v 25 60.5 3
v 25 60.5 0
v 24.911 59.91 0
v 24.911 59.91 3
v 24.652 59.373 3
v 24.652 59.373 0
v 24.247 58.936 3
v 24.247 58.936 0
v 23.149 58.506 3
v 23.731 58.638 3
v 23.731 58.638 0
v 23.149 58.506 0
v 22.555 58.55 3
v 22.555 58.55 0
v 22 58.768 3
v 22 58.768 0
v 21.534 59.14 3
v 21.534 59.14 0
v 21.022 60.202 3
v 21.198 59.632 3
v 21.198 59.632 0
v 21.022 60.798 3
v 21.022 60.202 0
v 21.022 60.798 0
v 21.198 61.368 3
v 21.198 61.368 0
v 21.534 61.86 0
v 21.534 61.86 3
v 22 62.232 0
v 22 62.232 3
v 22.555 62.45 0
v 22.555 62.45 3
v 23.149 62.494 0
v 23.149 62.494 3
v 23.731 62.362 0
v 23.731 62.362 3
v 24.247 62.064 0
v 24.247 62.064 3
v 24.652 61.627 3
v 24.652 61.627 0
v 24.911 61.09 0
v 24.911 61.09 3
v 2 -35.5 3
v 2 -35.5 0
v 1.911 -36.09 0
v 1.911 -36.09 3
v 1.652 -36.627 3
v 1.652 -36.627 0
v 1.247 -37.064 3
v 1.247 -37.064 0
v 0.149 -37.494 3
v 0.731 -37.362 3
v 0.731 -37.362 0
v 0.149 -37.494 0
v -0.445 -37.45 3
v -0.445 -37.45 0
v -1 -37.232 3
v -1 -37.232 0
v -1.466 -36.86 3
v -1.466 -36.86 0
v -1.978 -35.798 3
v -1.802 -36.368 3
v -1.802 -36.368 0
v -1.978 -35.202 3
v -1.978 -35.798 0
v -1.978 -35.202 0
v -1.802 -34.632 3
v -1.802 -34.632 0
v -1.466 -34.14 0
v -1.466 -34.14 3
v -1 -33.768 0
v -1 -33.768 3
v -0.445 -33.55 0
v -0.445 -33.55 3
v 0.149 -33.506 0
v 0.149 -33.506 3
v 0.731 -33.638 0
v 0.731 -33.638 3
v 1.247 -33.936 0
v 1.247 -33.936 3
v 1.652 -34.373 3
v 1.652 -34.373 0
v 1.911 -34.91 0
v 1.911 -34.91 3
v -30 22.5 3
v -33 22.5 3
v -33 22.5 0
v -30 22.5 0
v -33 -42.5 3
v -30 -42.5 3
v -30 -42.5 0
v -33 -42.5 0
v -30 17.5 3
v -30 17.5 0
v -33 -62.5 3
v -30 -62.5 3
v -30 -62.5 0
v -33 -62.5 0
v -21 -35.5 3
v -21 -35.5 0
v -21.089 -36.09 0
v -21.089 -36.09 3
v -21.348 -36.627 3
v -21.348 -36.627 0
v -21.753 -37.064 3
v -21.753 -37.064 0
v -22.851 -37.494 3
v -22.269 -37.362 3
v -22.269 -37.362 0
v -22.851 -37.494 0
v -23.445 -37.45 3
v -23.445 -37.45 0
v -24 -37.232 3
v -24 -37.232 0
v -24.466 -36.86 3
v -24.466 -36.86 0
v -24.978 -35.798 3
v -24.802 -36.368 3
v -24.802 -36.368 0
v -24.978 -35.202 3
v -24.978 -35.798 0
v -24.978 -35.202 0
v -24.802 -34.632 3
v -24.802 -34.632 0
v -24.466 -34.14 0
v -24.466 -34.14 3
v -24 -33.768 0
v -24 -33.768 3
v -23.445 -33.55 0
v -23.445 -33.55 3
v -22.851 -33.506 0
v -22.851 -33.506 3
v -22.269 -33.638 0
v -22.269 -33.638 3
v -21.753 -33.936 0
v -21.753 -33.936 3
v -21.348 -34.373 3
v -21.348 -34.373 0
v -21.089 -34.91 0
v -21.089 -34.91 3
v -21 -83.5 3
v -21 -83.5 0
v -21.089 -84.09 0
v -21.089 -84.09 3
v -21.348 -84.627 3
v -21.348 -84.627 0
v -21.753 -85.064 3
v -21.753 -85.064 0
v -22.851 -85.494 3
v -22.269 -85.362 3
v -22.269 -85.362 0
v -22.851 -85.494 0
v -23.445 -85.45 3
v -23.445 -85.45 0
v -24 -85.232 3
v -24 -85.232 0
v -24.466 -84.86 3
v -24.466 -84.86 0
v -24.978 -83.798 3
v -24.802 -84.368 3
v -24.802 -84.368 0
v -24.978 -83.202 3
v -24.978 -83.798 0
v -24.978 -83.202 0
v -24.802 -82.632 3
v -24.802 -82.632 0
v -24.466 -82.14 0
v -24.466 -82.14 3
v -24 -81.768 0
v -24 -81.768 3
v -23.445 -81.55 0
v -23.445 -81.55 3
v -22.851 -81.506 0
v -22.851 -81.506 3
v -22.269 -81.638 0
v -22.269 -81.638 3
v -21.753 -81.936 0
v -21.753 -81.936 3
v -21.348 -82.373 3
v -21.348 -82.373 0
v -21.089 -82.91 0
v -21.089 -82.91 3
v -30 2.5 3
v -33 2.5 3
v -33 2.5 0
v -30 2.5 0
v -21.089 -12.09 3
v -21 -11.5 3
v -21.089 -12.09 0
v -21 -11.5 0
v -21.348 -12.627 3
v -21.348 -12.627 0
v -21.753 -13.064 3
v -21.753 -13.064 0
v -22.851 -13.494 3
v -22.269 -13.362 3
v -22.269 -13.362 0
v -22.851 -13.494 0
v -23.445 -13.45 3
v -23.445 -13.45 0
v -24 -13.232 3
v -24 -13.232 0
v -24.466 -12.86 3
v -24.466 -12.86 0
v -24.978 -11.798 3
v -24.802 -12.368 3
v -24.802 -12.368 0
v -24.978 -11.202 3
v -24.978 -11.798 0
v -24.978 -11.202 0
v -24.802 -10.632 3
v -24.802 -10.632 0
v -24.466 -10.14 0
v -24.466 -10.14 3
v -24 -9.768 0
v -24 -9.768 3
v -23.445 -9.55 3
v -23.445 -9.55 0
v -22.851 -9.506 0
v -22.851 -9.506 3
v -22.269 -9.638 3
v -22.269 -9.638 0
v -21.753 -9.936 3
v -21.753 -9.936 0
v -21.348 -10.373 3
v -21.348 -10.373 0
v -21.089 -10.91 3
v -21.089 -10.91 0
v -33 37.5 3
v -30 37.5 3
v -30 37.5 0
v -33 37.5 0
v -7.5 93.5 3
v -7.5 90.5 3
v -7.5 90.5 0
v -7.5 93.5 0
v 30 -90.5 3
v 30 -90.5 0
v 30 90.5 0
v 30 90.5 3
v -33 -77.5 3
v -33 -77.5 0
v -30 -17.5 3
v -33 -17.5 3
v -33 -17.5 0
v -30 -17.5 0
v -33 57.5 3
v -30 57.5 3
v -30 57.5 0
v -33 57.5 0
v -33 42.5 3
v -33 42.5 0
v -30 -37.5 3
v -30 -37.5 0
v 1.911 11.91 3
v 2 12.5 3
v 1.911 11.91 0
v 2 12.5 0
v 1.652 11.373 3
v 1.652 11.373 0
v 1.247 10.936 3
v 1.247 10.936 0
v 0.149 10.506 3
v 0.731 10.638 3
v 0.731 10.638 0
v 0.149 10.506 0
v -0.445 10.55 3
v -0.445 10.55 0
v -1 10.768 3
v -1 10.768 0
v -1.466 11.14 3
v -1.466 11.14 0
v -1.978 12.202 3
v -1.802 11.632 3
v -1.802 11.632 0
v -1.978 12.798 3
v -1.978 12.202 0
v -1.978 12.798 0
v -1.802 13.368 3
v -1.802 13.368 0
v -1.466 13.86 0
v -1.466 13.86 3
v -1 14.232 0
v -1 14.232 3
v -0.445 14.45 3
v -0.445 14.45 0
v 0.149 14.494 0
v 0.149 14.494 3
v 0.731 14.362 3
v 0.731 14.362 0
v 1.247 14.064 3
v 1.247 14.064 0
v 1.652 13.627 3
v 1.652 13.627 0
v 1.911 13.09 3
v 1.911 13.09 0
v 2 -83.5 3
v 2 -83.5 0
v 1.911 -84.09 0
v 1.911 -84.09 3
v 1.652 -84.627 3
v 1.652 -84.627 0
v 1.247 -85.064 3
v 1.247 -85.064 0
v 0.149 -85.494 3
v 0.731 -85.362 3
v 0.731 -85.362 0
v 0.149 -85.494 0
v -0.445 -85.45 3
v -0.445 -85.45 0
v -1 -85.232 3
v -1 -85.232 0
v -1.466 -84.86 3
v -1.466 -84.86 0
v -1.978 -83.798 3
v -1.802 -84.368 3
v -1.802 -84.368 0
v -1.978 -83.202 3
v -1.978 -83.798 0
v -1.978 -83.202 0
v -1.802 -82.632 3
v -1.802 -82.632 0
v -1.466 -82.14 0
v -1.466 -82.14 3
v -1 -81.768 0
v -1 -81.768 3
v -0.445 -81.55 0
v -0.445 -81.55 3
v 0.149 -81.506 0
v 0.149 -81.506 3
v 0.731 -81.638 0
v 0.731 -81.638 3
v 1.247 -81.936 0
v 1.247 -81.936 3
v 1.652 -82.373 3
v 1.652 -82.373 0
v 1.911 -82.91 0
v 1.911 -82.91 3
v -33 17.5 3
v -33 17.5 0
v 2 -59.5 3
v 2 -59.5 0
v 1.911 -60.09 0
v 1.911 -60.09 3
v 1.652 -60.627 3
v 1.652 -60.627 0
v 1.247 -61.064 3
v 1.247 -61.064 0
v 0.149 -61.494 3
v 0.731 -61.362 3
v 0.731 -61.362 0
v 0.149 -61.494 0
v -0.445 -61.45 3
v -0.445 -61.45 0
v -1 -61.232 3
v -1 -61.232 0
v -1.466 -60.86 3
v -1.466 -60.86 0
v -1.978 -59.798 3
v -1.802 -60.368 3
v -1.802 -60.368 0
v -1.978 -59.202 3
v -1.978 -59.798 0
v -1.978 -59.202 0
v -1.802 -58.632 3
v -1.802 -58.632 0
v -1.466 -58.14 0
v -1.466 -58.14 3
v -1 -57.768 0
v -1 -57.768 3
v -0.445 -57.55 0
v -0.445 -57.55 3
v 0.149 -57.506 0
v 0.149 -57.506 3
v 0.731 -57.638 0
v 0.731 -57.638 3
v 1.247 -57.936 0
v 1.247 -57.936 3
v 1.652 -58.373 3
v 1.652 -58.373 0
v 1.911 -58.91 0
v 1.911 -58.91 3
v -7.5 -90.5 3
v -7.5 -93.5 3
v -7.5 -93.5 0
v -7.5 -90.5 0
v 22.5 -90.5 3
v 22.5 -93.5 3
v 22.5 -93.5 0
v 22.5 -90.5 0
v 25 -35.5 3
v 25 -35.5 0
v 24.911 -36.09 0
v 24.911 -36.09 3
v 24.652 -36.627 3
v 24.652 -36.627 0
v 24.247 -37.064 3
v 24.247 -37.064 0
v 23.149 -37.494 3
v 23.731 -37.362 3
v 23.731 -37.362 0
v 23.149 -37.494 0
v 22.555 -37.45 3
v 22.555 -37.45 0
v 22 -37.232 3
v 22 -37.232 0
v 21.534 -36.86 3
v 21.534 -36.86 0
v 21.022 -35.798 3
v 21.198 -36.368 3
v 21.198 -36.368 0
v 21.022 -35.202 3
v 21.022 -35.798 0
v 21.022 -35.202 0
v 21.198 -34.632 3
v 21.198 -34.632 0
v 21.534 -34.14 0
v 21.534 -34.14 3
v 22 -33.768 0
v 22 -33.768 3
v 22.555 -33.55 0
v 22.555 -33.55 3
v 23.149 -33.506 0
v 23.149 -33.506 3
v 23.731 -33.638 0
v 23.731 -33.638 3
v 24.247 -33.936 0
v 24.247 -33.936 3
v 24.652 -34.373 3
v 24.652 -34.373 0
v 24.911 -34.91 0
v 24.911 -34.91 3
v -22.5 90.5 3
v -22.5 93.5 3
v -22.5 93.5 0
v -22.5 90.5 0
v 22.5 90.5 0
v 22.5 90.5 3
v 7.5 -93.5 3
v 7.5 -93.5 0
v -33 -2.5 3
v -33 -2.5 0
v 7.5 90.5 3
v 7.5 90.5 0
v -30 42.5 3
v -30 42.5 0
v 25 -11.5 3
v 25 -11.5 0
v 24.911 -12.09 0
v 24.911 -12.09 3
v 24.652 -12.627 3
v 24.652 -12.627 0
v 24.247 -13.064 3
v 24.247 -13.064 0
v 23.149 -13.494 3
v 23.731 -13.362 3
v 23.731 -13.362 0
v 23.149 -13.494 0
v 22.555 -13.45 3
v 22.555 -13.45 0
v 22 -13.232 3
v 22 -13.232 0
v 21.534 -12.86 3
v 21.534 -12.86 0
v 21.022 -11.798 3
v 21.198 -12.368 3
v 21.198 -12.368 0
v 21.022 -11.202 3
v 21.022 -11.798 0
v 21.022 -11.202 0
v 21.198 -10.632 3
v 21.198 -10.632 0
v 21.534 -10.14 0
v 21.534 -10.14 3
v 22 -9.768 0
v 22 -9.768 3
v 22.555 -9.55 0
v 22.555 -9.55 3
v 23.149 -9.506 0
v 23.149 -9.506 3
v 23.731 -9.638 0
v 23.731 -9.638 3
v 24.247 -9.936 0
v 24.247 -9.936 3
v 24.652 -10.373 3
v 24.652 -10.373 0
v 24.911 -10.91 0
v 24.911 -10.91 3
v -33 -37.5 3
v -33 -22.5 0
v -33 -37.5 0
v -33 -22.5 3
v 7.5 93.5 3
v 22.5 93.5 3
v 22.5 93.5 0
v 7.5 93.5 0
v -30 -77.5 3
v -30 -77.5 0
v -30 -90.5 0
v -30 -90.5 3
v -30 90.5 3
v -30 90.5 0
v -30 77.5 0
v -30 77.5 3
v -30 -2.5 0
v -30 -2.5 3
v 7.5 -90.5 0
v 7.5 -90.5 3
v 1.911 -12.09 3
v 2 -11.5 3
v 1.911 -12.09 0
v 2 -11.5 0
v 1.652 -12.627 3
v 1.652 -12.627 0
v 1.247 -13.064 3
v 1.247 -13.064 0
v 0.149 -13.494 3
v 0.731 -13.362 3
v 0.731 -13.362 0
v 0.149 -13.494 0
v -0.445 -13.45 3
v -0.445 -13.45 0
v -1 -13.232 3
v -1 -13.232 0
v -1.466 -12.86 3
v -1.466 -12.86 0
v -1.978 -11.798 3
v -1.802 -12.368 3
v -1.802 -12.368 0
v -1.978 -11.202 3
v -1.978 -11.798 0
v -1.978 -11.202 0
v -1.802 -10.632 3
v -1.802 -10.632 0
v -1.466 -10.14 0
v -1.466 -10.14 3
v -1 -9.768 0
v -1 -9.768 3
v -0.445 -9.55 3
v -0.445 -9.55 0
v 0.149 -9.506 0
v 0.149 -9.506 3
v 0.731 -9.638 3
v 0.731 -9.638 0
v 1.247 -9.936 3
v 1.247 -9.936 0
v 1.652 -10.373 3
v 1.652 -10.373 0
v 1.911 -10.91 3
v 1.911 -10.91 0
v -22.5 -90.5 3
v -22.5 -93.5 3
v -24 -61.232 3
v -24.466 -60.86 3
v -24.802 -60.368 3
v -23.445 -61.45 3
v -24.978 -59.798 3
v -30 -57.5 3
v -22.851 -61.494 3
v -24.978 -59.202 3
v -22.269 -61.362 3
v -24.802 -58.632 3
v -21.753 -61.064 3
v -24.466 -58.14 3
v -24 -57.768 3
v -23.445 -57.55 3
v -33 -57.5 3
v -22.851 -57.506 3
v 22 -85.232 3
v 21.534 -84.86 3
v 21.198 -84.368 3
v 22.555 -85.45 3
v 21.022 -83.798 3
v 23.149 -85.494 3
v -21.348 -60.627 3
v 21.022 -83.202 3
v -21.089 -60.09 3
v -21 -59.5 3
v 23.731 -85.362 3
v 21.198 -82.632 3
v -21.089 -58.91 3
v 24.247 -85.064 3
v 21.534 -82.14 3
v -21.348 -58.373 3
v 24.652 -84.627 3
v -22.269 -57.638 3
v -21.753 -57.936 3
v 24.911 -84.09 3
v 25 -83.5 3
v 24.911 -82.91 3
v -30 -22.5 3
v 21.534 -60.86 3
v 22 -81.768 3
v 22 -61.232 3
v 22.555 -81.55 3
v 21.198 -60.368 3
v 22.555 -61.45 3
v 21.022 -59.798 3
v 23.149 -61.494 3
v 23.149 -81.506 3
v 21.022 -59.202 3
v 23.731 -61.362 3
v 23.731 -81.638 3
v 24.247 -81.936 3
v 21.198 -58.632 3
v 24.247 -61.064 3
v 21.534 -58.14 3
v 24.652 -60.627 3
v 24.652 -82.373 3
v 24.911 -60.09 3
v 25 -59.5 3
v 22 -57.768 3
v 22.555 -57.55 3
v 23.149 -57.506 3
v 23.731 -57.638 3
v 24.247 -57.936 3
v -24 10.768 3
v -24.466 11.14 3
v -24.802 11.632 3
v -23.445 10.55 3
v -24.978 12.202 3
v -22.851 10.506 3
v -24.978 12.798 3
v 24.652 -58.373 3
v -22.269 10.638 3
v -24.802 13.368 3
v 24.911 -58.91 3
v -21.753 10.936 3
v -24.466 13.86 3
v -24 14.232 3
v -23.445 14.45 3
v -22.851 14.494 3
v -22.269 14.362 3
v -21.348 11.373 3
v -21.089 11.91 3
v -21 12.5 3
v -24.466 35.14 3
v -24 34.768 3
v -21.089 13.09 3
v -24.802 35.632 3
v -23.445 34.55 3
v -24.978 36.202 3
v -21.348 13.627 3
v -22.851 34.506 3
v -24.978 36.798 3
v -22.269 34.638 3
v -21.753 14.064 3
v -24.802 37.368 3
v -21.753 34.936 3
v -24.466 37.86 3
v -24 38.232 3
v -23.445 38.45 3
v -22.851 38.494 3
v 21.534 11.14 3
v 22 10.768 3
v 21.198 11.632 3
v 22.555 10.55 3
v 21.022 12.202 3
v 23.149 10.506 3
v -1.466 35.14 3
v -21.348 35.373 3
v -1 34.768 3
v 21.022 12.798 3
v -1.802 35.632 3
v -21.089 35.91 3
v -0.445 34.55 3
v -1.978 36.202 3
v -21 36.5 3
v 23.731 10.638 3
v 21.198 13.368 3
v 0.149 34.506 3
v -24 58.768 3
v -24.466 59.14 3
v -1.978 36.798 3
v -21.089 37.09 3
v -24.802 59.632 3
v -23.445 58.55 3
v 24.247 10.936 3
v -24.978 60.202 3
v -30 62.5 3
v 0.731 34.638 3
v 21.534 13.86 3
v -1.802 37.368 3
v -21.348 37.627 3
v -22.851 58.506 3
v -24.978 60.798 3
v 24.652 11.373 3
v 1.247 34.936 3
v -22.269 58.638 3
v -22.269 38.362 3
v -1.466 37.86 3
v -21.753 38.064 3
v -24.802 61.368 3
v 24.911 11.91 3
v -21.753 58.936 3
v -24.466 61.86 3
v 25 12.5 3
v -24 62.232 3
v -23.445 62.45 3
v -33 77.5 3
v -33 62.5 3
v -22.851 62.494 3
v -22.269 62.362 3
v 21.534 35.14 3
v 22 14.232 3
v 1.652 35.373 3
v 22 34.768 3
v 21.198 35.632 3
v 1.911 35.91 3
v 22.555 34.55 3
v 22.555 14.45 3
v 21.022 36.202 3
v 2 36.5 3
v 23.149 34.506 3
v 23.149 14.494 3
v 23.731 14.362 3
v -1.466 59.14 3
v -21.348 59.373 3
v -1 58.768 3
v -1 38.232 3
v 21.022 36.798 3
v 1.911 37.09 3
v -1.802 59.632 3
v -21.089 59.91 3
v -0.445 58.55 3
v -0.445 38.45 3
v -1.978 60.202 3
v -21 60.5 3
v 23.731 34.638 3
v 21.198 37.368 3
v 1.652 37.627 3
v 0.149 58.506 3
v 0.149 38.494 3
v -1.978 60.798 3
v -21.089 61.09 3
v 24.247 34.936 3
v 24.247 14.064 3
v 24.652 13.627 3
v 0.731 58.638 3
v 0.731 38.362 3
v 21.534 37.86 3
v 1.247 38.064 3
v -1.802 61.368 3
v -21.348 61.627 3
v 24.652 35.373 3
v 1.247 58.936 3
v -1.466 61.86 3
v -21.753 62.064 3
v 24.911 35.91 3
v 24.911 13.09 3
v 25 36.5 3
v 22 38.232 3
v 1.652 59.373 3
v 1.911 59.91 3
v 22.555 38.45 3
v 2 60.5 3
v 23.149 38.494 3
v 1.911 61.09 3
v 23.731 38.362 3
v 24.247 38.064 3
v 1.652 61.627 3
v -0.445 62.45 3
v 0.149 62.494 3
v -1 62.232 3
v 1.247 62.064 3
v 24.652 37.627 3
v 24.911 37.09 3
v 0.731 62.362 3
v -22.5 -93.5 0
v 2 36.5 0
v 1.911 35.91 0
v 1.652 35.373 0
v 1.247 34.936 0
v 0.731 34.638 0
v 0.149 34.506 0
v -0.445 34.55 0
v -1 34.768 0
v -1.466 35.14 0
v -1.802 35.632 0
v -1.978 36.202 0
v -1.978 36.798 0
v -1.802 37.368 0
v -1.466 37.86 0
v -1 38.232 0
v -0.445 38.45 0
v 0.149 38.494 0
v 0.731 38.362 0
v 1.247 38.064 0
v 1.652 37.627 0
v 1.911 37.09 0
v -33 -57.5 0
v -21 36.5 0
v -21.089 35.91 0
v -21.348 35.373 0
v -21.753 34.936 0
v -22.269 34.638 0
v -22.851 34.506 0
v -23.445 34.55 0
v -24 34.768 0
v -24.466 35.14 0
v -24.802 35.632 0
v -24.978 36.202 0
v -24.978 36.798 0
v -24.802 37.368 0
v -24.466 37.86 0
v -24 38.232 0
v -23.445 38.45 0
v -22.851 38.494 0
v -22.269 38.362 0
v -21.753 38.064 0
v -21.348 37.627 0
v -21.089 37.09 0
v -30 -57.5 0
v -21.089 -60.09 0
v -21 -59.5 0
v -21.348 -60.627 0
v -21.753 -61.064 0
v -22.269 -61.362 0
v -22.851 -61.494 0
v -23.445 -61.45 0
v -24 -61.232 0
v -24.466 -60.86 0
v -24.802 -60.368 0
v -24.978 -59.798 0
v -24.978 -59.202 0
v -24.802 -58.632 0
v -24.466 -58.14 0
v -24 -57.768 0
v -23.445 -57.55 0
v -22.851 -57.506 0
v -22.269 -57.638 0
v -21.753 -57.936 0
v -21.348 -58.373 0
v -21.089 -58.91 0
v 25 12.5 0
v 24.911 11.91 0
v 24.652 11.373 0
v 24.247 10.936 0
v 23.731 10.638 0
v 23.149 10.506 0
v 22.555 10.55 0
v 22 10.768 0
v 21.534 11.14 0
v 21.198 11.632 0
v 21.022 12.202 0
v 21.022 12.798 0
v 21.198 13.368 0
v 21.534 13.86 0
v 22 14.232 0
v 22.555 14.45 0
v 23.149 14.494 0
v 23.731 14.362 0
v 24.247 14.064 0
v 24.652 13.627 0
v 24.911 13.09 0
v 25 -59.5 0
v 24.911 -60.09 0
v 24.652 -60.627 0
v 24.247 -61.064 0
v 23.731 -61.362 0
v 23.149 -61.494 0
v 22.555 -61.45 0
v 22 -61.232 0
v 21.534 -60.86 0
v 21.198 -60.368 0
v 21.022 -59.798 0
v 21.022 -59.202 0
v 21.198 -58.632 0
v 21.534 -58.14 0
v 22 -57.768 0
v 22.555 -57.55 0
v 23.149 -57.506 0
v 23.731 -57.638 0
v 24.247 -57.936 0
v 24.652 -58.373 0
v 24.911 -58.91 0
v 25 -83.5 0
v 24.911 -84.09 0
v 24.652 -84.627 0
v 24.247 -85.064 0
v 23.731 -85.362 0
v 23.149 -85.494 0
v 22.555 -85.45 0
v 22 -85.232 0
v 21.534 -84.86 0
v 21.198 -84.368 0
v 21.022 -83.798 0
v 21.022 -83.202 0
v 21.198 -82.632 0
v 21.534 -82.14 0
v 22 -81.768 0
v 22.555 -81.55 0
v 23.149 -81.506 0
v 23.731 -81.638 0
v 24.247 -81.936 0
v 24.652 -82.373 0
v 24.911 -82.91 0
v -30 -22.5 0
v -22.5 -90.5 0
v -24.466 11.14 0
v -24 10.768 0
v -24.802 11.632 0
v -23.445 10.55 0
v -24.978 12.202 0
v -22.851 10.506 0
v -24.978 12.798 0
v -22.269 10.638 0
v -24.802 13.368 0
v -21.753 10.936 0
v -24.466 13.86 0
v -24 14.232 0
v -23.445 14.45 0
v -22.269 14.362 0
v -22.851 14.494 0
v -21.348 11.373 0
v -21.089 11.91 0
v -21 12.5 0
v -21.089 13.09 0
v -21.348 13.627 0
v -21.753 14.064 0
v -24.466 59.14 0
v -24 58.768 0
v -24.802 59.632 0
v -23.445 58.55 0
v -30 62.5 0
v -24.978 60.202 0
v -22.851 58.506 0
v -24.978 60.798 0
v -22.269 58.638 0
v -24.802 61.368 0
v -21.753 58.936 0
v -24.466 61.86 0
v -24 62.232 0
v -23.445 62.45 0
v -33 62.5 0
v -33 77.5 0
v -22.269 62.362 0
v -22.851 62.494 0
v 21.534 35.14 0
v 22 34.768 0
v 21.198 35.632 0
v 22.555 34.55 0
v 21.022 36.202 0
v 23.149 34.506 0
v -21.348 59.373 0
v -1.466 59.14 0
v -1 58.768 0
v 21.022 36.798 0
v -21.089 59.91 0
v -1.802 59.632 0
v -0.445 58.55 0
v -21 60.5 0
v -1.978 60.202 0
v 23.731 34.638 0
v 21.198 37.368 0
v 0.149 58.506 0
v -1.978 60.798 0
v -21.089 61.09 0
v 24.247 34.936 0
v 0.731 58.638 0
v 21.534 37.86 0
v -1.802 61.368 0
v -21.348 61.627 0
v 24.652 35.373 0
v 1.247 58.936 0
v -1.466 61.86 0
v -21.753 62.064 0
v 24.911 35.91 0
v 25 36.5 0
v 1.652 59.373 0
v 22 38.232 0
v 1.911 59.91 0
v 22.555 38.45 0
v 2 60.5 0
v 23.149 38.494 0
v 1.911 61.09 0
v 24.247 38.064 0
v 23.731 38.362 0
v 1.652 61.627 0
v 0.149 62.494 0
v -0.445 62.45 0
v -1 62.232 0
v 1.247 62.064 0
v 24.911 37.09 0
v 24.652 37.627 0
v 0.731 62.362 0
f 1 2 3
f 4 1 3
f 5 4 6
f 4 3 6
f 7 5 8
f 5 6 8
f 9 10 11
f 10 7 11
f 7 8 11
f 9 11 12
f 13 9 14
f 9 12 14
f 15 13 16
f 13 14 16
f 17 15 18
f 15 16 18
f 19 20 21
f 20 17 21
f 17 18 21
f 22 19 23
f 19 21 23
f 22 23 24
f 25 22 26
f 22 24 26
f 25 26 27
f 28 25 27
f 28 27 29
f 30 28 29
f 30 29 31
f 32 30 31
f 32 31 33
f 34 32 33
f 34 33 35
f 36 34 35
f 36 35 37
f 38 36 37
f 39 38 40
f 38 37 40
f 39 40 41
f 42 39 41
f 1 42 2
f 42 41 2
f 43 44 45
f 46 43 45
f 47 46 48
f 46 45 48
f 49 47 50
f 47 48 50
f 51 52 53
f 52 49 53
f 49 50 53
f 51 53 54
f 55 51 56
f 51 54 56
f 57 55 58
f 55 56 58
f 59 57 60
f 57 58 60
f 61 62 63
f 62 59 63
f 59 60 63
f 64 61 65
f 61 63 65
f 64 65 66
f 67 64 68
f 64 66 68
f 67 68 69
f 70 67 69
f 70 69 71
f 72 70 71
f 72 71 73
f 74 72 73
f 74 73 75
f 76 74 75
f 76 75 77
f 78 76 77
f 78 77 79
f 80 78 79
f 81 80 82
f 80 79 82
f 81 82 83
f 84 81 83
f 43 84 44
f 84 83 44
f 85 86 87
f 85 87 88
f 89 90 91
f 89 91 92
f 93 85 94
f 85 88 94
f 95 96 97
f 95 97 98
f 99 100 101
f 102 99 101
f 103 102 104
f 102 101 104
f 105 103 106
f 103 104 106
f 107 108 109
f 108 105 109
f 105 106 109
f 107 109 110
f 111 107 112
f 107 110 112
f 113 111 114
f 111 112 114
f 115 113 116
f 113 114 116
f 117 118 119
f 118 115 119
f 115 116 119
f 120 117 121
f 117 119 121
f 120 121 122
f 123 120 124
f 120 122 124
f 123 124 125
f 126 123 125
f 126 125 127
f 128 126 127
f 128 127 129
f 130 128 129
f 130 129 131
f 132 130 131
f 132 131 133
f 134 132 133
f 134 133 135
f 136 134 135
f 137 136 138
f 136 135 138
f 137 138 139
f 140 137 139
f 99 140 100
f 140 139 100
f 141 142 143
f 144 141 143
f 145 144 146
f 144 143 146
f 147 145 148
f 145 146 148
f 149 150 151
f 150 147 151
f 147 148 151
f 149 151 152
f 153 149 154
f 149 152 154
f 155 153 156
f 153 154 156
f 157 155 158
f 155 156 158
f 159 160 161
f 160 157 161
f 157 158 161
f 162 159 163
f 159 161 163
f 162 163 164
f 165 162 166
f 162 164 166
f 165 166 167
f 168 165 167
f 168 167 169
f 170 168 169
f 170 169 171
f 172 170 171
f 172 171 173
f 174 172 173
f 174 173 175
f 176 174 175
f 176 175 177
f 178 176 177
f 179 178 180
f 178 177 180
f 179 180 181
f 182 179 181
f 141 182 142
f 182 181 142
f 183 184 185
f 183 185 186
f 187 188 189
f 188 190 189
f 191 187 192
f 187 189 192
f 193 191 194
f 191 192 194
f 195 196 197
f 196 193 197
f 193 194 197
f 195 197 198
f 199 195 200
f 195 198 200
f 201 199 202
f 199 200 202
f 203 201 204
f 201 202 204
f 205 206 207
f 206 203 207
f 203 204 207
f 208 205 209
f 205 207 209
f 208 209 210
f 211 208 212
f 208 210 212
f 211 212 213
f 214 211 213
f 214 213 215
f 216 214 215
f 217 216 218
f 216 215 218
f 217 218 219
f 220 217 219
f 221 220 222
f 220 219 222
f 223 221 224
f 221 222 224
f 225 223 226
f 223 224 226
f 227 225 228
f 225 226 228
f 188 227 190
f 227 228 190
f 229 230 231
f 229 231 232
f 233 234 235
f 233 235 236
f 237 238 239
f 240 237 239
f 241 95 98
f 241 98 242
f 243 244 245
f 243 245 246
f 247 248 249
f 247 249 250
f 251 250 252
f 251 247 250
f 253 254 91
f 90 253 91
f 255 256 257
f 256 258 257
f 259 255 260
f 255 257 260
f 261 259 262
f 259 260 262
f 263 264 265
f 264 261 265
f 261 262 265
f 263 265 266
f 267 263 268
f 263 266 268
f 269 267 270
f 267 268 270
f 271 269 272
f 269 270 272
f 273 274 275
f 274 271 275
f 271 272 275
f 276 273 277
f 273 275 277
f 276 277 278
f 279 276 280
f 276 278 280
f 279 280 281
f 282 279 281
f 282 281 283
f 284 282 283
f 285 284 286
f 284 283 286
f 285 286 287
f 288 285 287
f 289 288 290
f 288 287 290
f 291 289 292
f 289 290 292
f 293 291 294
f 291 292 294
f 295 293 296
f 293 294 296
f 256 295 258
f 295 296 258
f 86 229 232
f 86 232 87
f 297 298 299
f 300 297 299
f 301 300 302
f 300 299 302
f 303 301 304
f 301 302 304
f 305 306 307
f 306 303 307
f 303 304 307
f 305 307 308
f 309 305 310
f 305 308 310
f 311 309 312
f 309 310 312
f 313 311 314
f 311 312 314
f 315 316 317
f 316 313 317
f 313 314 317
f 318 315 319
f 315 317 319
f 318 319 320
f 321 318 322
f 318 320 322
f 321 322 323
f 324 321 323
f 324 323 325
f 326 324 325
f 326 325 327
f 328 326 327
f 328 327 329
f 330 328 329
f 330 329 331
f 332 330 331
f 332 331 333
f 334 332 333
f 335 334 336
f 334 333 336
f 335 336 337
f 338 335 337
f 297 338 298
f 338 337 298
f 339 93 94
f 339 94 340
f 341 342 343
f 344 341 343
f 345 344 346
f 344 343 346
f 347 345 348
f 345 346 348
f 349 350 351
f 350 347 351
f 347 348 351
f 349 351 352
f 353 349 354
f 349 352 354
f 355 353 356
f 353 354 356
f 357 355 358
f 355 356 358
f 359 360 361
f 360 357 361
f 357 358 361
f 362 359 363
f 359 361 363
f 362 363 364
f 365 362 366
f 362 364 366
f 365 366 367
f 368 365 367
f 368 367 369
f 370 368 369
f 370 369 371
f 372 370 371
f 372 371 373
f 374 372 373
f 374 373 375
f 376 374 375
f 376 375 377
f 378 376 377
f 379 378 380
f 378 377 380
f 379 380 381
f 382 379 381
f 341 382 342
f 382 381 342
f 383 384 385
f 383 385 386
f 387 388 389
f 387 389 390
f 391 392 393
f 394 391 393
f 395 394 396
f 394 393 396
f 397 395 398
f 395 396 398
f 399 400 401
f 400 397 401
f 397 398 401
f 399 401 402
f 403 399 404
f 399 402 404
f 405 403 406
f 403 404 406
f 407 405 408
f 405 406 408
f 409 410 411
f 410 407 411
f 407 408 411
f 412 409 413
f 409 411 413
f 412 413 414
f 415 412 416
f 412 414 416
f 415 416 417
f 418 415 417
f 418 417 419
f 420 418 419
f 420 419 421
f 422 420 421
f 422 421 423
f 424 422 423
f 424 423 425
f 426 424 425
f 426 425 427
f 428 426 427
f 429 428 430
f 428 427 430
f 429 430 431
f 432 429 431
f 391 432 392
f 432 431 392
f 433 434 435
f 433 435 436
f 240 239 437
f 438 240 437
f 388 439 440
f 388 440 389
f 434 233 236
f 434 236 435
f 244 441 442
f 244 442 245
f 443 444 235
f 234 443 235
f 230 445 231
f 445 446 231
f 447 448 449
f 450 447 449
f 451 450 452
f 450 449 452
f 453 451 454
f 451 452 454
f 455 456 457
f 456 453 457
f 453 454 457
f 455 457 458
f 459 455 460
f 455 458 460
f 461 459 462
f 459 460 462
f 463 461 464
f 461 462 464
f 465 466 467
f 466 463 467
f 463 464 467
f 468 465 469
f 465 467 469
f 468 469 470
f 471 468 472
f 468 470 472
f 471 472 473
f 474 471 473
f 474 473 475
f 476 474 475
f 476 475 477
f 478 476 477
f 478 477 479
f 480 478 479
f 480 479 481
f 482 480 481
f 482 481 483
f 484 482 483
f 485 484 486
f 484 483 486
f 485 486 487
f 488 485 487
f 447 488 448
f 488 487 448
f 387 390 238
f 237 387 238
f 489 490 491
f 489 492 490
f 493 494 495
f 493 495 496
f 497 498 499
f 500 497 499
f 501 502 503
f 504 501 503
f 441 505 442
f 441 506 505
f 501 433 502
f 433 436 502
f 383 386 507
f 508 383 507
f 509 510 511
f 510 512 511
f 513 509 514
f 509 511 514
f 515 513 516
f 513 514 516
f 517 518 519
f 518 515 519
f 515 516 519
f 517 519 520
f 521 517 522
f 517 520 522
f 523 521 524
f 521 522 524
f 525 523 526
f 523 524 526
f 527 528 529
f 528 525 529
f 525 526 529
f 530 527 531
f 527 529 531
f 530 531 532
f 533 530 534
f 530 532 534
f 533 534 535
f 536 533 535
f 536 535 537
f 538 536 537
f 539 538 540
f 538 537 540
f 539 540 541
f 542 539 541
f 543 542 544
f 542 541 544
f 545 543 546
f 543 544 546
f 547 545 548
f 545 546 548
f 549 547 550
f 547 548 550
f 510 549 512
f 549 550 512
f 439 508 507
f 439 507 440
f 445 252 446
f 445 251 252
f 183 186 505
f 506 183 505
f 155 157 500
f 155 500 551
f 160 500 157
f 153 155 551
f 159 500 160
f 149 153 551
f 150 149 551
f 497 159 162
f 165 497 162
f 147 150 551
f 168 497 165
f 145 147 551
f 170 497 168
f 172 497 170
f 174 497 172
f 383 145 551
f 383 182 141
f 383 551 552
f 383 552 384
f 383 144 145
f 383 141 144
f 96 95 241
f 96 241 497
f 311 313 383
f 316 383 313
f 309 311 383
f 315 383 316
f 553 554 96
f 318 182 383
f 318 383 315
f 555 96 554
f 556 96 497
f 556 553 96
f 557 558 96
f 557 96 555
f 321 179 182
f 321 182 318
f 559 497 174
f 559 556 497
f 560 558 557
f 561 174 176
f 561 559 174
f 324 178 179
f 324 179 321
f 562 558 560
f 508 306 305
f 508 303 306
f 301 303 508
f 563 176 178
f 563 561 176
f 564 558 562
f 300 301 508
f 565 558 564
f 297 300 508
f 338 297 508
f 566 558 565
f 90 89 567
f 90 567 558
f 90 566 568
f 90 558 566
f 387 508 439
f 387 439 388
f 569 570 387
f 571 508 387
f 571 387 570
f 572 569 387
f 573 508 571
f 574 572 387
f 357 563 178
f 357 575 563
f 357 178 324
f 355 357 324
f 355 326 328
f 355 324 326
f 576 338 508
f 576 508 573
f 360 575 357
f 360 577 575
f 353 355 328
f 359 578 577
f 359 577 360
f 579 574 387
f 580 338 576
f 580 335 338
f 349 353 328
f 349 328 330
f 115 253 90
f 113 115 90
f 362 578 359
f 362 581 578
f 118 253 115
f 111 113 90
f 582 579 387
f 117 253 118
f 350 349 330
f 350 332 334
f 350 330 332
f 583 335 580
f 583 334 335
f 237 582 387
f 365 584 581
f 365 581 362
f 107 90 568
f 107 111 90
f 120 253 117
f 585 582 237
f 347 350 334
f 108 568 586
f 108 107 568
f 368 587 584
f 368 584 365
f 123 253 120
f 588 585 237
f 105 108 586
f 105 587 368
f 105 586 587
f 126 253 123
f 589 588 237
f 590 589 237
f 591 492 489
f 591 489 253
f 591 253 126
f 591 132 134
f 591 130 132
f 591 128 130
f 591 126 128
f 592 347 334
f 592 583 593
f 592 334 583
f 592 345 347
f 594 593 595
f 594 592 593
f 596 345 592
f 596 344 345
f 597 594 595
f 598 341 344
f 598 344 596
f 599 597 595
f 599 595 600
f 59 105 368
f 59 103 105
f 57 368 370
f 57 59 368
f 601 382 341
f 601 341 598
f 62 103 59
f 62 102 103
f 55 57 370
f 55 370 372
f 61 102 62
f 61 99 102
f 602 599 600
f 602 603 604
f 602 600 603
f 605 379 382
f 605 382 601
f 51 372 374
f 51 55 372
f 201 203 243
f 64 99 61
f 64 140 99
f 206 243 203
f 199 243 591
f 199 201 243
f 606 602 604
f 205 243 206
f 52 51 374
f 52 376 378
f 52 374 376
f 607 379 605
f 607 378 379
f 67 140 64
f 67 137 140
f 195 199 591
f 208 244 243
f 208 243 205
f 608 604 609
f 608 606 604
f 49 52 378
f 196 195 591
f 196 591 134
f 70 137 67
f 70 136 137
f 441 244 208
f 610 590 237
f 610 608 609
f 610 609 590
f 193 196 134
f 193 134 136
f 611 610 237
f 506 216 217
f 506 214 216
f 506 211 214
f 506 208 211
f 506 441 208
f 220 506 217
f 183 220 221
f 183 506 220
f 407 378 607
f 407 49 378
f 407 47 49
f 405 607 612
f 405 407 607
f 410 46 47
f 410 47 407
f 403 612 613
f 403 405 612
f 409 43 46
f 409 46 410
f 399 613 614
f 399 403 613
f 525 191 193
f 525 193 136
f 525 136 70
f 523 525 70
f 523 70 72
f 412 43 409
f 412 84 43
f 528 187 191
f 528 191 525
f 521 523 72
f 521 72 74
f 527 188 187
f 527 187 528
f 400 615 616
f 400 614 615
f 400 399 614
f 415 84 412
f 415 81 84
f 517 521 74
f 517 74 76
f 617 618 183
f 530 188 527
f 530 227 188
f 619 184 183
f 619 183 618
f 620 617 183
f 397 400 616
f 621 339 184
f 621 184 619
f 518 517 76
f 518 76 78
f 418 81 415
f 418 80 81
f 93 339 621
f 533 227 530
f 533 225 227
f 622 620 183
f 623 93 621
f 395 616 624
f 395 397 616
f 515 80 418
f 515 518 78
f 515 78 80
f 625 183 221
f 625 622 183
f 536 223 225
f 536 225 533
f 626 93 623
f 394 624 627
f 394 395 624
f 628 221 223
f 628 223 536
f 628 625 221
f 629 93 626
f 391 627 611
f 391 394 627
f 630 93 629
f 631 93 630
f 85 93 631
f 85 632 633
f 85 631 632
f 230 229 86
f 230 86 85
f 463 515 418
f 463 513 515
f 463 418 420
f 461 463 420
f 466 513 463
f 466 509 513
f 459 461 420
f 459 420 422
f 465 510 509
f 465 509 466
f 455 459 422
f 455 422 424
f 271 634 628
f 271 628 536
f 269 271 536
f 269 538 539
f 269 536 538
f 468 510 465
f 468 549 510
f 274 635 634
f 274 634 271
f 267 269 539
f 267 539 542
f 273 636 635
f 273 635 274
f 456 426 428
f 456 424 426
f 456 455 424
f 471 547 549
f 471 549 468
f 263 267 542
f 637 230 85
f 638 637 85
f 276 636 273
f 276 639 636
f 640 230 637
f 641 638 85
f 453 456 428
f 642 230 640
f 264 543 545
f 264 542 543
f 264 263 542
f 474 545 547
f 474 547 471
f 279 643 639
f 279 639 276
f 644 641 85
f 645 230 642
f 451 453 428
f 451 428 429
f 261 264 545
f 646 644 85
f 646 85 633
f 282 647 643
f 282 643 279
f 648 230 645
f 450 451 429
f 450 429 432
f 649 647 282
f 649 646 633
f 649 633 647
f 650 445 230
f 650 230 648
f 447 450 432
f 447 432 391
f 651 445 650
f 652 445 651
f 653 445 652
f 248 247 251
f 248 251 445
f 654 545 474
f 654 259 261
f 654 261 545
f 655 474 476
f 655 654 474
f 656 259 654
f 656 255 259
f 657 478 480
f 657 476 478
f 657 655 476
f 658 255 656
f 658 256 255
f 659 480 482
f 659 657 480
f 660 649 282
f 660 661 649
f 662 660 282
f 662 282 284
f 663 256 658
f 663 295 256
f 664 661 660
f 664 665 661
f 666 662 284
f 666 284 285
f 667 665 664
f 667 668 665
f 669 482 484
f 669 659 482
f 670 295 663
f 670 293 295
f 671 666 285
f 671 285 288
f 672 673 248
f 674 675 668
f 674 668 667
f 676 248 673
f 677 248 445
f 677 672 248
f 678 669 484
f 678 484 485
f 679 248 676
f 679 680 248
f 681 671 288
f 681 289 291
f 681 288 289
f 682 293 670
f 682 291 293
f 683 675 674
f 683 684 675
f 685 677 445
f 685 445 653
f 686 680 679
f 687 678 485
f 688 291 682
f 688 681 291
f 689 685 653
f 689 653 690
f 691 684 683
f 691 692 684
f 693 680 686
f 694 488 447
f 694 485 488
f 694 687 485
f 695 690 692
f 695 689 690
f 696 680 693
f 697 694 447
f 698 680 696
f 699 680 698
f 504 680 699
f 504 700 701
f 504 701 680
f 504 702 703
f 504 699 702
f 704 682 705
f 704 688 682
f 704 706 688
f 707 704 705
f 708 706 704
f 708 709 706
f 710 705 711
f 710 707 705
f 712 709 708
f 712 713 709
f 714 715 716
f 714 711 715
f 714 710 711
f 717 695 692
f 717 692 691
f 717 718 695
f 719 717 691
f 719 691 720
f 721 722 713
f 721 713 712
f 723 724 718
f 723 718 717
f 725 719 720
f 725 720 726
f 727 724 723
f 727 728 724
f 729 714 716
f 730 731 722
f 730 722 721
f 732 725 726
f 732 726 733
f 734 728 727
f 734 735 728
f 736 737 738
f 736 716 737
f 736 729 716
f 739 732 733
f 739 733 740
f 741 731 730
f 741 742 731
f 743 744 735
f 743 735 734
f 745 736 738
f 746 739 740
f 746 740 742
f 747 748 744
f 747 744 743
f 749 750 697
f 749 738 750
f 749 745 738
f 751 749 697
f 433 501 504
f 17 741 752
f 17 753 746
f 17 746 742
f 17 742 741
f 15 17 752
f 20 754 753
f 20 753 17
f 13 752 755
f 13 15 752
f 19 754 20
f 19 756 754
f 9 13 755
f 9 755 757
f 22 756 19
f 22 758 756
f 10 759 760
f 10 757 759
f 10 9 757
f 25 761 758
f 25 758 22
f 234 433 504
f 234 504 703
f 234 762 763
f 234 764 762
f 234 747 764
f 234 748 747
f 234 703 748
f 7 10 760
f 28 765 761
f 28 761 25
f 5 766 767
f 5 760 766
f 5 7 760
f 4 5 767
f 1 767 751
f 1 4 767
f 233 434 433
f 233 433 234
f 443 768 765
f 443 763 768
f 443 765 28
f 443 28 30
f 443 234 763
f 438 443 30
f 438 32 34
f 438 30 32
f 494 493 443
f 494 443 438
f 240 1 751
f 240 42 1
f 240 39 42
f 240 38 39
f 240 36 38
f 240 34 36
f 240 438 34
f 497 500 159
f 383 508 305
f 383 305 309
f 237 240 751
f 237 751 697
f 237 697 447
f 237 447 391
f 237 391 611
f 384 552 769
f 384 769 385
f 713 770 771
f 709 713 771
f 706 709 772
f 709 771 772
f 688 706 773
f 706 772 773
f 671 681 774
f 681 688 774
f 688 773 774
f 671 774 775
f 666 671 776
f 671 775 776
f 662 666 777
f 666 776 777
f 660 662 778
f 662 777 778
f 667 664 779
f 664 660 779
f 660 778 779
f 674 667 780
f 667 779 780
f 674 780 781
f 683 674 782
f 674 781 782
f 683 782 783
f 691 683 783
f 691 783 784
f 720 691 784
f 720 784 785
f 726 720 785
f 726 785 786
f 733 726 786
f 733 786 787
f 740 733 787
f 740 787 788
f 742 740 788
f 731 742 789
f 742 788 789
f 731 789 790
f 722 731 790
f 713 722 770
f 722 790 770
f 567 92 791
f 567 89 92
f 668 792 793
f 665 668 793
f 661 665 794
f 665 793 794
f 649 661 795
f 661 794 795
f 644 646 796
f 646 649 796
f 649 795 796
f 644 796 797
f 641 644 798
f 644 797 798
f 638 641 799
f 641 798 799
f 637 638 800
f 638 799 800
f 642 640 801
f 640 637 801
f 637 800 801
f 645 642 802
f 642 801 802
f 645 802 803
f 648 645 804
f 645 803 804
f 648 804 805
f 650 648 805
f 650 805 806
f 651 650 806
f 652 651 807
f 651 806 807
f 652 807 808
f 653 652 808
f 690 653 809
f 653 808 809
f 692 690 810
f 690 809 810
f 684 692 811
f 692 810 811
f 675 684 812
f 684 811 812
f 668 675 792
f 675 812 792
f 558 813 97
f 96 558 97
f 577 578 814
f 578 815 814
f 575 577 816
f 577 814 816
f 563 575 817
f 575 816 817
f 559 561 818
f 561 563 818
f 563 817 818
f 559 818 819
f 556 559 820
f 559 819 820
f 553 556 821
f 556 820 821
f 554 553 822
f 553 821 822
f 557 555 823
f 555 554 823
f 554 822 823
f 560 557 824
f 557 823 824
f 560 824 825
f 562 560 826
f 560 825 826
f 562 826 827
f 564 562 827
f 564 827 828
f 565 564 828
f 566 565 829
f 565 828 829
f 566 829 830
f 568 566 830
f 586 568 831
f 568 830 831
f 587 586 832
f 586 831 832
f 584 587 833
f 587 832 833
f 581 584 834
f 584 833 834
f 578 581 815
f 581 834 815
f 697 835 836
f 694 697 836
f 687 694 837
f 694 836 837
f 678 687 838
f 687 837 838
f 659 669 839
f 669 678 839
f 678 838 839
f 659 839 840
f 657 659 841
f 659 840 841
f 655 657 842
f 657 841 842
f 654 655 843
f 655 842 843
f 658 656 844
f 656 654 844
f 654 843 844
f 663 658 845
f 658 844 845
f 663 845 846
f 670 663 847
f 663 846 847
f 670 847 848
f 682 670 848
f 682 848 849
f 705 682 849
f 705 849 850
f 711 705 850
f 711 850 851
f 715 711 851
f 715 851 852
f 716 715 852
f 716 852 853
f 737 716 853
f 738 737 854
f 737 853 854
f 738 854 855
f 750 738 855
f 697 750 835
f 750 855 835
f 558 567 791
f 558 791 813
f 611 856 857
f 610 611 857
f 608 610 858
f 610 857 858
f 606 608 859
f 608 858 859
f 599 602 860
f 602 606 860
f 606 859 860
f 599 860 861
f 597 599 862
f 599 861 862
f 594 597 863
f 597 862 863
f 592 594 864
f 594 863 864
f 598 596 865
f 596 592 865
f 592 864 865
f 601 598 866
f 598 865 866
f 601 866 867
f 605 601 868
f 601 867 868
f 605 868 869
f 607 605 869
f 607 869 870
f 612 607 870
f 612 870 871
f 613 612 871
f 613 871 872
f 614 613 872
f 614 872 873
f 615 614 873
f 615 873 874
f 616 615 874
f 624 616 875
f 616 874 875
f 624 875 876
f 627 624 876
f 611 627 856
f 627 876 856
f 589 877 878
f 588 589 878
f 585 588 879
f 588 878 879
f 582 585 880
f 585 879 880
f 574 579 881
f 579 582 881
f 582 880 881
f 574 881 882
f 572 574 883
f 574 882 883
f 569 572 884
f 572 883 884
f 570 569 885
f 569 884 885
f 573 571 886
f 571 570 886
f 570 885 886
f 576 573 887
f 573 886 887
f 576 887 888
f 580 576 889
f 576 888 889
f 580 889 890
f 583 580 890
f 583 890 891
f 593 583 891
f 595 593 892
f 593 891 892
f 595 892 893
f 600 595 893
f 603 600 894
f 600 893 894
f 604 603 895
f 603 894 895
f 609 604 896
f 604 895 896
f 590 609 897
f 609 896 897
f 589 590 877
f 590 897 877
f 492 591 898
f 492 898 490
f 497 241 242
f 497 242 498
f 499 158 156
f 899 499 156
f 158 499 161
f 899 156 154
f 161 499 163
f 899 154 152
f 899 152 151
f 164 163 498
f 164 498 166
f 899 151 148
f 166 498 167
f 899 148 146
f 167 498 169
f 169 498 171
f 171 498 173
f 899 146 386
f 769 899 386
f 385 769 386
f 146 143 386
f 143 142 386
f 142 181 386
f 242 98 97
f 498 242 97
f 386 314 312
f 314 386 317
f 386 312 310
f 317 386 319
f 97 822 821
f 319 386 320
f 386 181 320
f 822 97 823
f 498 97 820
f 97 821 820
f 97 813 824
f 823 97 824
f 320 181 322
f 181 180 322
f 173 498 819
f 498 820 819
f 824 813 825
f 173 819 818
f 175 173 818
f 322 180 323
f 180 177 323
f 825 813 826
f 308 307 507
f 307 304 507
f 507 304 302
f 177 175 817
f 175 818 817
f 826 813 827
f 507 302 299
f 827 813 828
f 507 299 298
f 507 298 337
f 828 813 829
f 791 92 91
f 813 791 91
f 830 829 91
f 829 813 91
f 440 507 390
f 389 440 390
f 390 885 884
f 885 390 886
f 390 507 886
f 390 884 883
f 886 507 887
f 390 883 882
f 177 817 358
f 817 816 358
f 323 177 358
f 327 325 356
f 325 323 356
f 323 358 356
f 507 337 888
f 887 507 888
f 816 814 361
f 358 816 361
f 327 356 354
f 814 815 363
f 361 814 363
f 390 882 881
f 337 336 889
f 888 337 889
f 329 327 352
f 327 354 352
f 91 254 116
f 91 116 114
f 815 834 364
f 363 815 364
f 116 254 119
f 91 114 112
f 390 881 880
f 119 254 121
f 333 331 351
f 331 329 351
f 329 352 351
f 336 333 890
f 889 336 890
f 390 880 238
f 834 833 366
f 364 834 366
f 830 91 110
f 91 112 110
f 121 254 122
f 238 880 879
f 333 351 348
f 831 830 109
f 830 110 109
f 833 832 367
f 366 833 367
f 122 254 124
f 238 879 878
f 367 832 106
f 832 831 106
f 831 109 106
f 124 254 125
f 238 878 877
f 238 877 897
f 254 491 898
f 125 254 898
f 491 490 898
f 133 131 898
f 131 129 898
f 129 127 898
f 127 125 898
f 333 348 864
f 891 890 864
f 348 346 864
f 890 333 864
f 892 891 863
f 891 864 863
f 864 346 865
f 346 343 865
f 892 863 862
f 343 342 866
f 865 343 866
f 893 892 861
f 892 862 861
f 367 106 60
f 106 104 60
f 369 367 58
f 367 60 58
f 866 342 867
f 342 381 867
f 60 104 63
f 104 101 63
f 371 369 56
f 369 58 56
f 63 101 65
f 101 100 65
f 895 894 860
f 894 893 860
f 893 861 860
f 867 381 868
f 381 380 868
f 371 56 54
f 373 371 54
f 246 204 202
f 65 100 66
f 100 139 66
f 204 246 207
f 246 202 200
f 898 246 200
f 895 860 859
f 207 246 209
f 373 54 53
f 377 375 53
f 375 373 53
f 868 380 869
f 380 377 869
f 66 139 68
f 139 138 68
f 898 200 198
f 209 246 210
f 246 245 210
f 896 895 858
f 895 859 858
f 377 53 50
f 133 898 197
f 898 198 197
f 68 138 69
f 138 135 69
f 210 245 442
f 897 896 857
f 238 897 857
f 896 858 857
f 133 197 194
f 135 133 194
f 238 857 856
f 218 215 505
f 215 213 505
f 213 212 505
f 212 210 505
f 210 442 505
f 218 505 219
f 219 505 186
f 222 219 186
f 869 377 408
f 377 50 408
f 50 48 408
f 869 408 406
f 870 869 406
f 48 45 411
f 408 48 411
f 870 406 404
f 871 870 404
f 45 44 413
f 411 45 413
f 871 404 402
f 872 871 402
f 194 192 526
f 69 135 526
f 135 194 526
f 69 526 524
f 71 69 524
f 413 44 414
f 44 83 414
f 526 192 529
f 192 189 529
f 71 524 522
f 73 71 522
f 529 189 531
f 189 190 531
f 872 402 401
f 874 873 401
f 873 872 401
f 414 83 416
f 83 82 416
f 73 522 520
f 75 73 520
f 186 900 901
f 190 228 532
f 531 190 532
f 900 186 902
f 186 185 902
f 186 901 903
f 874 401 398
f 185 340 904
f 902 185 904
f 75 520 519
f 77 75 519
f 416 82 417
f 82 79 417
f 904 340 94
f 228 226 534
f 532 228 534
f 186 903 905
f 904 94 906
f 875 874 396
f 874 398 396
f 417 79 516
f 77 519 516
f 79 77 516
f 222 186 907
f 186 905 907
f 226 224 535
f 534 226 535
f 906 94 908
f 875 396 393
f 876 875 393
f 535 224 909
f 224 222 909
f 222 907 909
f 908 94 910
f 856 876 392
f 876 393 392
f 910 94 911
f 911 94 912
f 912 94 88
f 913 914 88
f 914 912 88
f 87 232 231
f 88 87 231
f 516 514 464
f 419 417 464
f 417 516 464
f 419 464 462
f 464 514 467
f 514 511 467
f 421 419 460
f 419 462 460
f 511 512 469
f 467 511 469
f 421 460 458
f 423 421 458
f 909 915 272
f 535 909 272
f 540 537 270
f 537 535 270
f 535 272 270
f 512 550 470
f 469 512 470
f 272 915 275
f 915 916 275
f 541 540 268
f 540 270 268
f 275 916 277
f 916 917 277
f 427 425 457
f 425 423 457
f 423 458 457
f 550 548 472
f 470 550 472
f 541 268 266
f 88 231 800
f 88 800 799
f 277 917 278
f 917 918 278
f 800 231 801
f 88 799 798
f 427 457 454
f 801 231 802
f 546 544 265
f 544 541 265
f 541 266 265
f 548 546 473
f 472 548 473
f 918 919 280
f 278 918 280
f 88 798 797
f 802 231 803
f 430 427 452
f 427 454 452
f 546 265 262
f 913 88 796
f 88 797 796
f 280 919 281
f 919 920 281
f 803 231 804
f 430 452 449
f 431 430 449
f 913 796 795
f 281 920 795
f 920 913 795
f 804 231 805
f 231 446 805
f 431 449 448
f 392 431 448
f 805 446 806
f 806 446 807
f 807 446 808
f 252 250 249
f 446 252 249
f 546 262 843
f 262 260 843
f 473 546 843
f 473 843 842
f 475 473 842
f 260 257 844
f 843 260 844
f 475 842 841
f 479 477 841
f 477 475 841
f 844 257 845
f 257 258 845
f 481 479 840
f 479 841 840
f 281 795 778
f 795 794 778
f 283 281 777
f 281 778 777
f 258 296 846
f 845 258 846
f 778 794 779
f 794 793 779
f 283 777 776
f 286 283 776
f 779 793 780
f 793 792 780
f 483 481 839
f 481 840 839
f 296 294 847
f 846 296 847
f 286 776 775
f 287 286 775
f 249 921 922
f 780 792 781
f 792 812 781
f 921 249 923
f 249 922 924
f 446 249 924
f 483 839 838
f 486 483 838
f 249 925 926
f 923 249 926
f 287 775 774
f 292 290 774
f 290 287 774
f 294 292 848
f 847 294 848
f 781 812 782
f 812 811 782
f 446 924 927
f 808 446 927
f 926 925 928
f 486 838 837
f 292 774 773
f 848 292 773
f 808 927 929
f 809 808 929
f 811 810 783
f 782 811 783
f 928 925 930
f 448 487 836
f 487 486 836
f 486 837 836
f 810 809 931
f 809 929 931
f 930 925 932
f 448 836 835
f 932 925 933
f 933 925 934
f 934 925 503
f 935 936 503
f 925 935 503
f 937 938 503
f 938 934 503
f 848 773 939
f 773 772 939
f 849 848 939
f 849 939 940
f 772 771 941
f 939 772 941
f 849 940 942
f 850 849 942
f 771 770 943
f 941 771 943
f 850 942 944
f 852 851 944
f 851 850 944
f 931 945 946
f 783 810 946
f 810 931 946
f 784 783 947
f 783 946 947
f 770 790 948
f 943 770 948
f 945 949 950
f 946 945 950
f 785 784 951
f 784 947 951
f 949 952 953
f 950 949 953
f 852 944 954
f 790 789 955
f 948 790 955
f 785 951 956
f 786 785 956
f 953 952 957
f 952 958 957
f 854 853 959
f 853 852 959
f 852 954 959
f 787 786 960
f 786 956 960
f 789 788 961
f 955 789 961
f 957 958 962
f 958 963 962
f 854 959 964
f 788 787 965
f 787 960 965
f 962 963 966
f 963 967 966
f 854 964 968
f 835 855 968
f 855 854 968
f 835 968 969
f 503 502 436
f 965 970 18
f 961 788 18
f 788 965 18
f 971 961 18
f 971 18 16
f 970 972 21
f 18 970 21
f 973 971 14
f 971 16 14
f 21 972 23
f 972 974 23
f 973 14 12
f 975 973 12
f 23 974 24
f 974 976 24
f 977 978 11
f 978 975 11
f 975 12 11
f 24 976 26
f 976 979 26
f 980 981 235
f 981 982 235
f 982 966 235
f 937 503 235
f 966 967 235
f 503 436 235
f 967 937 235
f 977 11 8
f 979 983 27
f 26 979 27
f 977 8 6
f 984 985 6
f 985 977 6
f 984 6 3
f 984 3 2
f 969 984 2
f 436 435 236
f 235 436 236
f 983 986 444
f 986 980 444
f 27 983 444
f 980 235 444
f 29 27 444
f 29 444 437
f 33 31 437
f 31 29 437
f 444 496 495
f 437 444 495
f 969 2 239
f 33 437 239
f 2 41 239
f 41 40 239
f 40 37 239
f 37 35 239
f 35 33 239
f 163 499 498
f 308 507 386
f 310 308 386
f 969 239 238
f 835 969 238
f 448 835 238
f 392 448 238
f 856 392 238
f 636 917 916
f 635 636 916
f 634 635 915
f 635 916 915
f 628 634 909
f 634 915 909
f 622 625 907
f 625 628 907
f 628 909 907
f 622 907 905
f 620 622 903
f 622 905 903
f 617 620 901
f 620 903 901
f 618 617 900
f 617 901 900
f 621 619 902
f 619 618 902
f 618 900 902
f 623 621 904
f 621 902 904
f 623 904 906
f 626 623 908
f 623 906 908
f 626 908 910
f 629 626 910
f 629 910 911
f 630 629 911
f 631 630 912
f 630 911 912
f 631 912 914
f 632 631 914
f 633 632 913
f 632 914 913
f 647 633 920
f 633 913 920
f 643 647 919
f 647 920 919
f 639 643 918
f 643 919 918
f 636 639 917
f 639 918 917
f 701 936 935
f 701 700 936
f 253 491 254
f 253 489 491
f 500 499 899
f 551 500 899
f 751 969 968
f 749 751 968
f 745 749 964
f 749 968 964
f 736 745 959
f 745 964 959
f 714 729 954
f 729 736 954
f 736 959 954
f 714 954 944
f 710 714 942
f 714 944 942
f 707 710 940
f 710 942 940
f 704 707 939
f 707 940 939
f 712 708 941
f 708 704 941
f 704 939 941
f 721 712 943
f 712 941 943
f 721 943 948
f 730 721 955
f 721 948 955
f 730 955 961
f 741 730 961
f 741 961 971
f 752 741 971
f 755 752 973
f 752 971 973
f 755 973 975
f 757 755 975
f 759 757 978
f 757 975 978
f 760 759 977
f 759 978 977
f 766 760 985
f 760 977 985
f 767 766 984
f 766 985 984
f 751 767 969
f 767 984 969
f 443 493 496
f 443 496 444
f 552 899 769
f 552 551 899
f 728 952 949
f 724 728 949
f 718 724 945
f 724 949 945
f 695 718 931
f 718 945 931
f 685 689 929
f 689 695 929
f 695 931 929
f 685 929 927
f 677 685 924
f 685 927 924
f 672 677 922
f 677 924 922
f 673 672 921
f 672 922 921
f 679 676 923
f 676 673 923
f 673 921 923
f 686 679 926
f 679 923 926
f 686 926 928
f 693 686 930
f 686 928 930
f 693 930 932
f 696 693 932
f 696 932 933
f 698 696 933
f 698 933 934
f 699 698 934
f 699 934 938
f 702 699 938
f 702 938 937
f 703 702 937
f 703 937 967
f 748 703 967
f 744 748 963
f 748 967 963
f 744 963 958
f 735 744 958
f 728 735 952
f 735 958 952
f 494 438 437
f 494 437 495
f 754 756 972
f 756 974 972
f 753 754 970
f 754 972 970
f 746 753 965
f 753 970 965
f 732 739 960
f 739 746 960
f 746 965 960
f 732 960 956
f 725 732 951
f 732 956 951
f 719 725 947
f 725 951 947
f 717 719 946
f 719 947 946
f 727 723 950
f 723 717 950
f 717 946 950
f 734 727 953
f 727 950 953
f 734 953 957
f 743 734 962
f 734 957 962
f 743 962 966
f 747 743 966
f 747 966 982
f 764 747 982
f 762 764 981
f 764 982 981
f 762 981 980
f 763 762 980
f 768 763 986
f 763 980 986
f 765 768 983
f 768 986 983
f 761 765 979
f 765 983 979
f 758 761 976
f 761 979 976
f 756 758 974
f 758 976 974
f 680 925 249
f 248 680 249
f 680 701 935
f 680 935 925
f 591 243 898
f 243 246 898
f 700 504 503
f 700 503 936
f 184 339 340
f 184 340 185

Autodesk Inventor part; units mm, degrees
ref_plane "YZ Plane" through (0, 0, 0) normal (1, 0, 0) x (0, 1, 0)
ref_plane "XZ Plane" through (0, 0, 0) normal (0, 1, 0) x (-1, 0, 0)
ref_plane "XY Plane" through (0, 0, 0) normal (0, 0, 1) x (1, 0, 0)
sketch "Sketch1" plane through (0, 0, 0) normal (0, 0, 1) x (1, 0, 0)
  line L0 (-30, -90.5) -> (30, -90.5)
  line L1 (30, -90.5) -> (30, 90.5)
  line L2 (30, 90.5) -> (-30, 90.5)
  line L3 (-30, 90.5) -> (-30, -90.5)
  line L4 (-30, -90.5) -> (30, 90.5) construction
  line L5 (30, -90.5) -> (-30, 90.5) construction
  circle A0 centre (-23, 60.5) radius 2
  circle A1 centre (-23, 36.5) radius 2
  circle A2 centre (-23, 12.5) radius 2
  circle A3 centre (-23, -11.5) radius 2
  circle A4 centre (-23, -35.5) radius 2
  circle A5 centre (-23, -59.5) radius 2
  circle A6 centre (-23, -83.5) radius 2
  circle A7 centre (0, 60.5) radius 2
  circle A8 centre (0, 36.5) radius 2
  circle A9 centre (0, 12.5) radius 2
  circle A10 centre (0, -11.5) radius 2
  circle A11 centre (0, -35.5) radius 2
  circle A12 centre (0, -59.5) radius 2
  circle A13 centre (0, -83.5) radius 2
  circle A14 centre (23, 60.5) radius 2
  circle A15 centre (23, 36.5) radius 2
  circle A16 centre (23, 12.5) radius 2
  circle A17 centre (23, -11.5) radius 2
  circle A18 centre (23, -35.5) radius 2
  circle A19 centre (23, -59.5) radius 2
  circle A20 centre (23, -83.5) radius 2
  point P0 (0, 0)
  dimension "d0" = 60
  dimension "d1" = 181
  dimension "d2" = 4
  dimension "d3" = 30
  dimension "d6" = 24
  dimension "d9" = 23
  dimension "d12" = 7
extrude "Extrusion1" add sketch "Sketch1" along normal blind 3
sketch "Sketch2" plane through (0, 0, 3) normal (0, 0, 1) x (1, 0, 0)
  line L0 (-30, 90.5) -> (-30, -90.5) projected
  line L1 (-30, 77.5) -> (-33, 77.5)
  line L2 (-33, 77.5) -> (-33, 62.5)
  line L3 (-33, 62.5) -> (-30, 62.5)
  line L4 (-30, 62.5) -> (-30, 77.5)
  line L5 (-30, 57.5) -> (-33, 57.5)
  line L6 (-33, 57.5) -> (-33, 42.5)
  line L7 (-33, 42.5) -> (-30, 42.5)
  line L8 (-30, 42.5) -> (-30, 57.5)
  line L9 (-30, 37.5) -> (-33, 37.5)
  line L10 (-33, 37.5) -> (-33, 22.5)
  line L11 (-33, 22.5) -> (-30, 22.5)
  line L12 (-30, 22.5) -> (-30, 37.5)
  line L13 (-30, 17.5) -> (-33, 17.5)
  line L14 (-33, 17.5) -> (-33, 2.5)
  line L15 (-33, 2.5) -> (-30, 2.5)
  line L16 (-30, 2.5) -> (-30, 17.5)
  line L17 (-30, -2.5) -> (-33, -2.5)
  line L18 (-33, -2.5) -> (-33, -17.5)
  line L19 (-33, -17.5) -> (-30, -17.5)
  line L20 (-30, -17.5) -> (-30, -2.5)
  line L21 (-30, -22.5) -> (-33, -22.5)
  line L22 (-33, -22.5) -> (-33, -37.5)
  line L23 (-33, -37.5) -> (-30, -37.5)
  line L24 (-30, -37.5) -> (-30, -22.5)
  line L25 (-30, -42.5) -> (-33, -42.5)
  line L26 (-33, -42.5) -> (-33, -57.5)
  line L27 (-33, -57.5) -> (-30, -57.5)
  line L28 (-30, -57.5) -> (-30, -42.5)
  line L29 (-30, -62.5) -> (-33, -62.5)
  line L30 (-33, -62.5) -> (-33, -77.5)
  line L31 (-33, -77.5) -> (-30, -77.5)
  line L32 (-30, -77.5) -> (-30, -62.5)
  point P0 (0, 0)
  dimension "d15" = 3
  dimension "d16" = 15
  dimension "d17" = 13
  dimension "d20" = 20
extrude "Extrusion2" add sketch "Sketch2" against normal blind 3
sketch "Sketch3" plane through (0, 0, 3) normal (0, 0, 1) x (1, 0, 0)
  line L0 (30, 90.5) -> (-30, 90.5) projected
  line L1 (-22.5, 90.5) -> (-7.5, 90.5)
  line L2 (-7.5, 90.5) -> (-7.5, 93.5)
  line L3 (-7.5, 93.5) -> (-22.5, 93.5)
  line L4 (-22.5, 93.5) -> (-22.5, 90.5)
  line L5 (-22.5, -93.5) -> (-7.5, -93.5)
  line L6 (-7.5, -93.5) -> (-7.5, -90.5)
  line L7 (-7.5, -90.5) -> (-22.5, -90.5)
  line L8 (-22.5, -90.5) -> (-22.5, -93.5)
  line L9 (7.5, 90.5) -> (22.5, 90.5)
  line L10 (22.5, 90.5) -> (22.5, 93.5)
  line L11 (22.5, 93.5) -> (7.5, 93.5)
  line L12 (7.5, 93.5) -> (7.5, 90.5)
  line L13 (7.5, -93.5) -> (22.5, -93.5)
  line L14 (22.5, -93.5) -> (22.5, -90.5)
  line L15 (22.5, -90.5) -> (7.5, -90.5)
  line L16 (7.5, -90.5) -> (7.5, -93.5)
  line L17 (-30, 90.5) -> (-30, 77.5) projected
  point P0 (0, 0)
  dimension "d27" = 15
  dimension "d28" = 3
  dimension "d31" = 184
  dimension "d34" = 30
  dimension "d37" = 7.5
extrude "Extrusion3" add sketch "Sketch3" against normal blind 3
equation "\"BendRadius\" = Thickness"
equation "\"BendReliefWidth\" = Thickness"
equation "\"BendReliefDepth\" = 0.5 * Thickness"
equation "\"CornerReliefSize\" = 4 * Thickness"
equation "\"MinimumRemnant\" = 2 * Thickness"
equation "\"TransitionRadius\" = BendRadius"
equation "\"JacobiRadiusSize\" = BendRadius"
equation "\"GapSize\" = Thickness"
equation "\"Thickness\" = 0.5"
properties part number "2 binnen zijplaat"
